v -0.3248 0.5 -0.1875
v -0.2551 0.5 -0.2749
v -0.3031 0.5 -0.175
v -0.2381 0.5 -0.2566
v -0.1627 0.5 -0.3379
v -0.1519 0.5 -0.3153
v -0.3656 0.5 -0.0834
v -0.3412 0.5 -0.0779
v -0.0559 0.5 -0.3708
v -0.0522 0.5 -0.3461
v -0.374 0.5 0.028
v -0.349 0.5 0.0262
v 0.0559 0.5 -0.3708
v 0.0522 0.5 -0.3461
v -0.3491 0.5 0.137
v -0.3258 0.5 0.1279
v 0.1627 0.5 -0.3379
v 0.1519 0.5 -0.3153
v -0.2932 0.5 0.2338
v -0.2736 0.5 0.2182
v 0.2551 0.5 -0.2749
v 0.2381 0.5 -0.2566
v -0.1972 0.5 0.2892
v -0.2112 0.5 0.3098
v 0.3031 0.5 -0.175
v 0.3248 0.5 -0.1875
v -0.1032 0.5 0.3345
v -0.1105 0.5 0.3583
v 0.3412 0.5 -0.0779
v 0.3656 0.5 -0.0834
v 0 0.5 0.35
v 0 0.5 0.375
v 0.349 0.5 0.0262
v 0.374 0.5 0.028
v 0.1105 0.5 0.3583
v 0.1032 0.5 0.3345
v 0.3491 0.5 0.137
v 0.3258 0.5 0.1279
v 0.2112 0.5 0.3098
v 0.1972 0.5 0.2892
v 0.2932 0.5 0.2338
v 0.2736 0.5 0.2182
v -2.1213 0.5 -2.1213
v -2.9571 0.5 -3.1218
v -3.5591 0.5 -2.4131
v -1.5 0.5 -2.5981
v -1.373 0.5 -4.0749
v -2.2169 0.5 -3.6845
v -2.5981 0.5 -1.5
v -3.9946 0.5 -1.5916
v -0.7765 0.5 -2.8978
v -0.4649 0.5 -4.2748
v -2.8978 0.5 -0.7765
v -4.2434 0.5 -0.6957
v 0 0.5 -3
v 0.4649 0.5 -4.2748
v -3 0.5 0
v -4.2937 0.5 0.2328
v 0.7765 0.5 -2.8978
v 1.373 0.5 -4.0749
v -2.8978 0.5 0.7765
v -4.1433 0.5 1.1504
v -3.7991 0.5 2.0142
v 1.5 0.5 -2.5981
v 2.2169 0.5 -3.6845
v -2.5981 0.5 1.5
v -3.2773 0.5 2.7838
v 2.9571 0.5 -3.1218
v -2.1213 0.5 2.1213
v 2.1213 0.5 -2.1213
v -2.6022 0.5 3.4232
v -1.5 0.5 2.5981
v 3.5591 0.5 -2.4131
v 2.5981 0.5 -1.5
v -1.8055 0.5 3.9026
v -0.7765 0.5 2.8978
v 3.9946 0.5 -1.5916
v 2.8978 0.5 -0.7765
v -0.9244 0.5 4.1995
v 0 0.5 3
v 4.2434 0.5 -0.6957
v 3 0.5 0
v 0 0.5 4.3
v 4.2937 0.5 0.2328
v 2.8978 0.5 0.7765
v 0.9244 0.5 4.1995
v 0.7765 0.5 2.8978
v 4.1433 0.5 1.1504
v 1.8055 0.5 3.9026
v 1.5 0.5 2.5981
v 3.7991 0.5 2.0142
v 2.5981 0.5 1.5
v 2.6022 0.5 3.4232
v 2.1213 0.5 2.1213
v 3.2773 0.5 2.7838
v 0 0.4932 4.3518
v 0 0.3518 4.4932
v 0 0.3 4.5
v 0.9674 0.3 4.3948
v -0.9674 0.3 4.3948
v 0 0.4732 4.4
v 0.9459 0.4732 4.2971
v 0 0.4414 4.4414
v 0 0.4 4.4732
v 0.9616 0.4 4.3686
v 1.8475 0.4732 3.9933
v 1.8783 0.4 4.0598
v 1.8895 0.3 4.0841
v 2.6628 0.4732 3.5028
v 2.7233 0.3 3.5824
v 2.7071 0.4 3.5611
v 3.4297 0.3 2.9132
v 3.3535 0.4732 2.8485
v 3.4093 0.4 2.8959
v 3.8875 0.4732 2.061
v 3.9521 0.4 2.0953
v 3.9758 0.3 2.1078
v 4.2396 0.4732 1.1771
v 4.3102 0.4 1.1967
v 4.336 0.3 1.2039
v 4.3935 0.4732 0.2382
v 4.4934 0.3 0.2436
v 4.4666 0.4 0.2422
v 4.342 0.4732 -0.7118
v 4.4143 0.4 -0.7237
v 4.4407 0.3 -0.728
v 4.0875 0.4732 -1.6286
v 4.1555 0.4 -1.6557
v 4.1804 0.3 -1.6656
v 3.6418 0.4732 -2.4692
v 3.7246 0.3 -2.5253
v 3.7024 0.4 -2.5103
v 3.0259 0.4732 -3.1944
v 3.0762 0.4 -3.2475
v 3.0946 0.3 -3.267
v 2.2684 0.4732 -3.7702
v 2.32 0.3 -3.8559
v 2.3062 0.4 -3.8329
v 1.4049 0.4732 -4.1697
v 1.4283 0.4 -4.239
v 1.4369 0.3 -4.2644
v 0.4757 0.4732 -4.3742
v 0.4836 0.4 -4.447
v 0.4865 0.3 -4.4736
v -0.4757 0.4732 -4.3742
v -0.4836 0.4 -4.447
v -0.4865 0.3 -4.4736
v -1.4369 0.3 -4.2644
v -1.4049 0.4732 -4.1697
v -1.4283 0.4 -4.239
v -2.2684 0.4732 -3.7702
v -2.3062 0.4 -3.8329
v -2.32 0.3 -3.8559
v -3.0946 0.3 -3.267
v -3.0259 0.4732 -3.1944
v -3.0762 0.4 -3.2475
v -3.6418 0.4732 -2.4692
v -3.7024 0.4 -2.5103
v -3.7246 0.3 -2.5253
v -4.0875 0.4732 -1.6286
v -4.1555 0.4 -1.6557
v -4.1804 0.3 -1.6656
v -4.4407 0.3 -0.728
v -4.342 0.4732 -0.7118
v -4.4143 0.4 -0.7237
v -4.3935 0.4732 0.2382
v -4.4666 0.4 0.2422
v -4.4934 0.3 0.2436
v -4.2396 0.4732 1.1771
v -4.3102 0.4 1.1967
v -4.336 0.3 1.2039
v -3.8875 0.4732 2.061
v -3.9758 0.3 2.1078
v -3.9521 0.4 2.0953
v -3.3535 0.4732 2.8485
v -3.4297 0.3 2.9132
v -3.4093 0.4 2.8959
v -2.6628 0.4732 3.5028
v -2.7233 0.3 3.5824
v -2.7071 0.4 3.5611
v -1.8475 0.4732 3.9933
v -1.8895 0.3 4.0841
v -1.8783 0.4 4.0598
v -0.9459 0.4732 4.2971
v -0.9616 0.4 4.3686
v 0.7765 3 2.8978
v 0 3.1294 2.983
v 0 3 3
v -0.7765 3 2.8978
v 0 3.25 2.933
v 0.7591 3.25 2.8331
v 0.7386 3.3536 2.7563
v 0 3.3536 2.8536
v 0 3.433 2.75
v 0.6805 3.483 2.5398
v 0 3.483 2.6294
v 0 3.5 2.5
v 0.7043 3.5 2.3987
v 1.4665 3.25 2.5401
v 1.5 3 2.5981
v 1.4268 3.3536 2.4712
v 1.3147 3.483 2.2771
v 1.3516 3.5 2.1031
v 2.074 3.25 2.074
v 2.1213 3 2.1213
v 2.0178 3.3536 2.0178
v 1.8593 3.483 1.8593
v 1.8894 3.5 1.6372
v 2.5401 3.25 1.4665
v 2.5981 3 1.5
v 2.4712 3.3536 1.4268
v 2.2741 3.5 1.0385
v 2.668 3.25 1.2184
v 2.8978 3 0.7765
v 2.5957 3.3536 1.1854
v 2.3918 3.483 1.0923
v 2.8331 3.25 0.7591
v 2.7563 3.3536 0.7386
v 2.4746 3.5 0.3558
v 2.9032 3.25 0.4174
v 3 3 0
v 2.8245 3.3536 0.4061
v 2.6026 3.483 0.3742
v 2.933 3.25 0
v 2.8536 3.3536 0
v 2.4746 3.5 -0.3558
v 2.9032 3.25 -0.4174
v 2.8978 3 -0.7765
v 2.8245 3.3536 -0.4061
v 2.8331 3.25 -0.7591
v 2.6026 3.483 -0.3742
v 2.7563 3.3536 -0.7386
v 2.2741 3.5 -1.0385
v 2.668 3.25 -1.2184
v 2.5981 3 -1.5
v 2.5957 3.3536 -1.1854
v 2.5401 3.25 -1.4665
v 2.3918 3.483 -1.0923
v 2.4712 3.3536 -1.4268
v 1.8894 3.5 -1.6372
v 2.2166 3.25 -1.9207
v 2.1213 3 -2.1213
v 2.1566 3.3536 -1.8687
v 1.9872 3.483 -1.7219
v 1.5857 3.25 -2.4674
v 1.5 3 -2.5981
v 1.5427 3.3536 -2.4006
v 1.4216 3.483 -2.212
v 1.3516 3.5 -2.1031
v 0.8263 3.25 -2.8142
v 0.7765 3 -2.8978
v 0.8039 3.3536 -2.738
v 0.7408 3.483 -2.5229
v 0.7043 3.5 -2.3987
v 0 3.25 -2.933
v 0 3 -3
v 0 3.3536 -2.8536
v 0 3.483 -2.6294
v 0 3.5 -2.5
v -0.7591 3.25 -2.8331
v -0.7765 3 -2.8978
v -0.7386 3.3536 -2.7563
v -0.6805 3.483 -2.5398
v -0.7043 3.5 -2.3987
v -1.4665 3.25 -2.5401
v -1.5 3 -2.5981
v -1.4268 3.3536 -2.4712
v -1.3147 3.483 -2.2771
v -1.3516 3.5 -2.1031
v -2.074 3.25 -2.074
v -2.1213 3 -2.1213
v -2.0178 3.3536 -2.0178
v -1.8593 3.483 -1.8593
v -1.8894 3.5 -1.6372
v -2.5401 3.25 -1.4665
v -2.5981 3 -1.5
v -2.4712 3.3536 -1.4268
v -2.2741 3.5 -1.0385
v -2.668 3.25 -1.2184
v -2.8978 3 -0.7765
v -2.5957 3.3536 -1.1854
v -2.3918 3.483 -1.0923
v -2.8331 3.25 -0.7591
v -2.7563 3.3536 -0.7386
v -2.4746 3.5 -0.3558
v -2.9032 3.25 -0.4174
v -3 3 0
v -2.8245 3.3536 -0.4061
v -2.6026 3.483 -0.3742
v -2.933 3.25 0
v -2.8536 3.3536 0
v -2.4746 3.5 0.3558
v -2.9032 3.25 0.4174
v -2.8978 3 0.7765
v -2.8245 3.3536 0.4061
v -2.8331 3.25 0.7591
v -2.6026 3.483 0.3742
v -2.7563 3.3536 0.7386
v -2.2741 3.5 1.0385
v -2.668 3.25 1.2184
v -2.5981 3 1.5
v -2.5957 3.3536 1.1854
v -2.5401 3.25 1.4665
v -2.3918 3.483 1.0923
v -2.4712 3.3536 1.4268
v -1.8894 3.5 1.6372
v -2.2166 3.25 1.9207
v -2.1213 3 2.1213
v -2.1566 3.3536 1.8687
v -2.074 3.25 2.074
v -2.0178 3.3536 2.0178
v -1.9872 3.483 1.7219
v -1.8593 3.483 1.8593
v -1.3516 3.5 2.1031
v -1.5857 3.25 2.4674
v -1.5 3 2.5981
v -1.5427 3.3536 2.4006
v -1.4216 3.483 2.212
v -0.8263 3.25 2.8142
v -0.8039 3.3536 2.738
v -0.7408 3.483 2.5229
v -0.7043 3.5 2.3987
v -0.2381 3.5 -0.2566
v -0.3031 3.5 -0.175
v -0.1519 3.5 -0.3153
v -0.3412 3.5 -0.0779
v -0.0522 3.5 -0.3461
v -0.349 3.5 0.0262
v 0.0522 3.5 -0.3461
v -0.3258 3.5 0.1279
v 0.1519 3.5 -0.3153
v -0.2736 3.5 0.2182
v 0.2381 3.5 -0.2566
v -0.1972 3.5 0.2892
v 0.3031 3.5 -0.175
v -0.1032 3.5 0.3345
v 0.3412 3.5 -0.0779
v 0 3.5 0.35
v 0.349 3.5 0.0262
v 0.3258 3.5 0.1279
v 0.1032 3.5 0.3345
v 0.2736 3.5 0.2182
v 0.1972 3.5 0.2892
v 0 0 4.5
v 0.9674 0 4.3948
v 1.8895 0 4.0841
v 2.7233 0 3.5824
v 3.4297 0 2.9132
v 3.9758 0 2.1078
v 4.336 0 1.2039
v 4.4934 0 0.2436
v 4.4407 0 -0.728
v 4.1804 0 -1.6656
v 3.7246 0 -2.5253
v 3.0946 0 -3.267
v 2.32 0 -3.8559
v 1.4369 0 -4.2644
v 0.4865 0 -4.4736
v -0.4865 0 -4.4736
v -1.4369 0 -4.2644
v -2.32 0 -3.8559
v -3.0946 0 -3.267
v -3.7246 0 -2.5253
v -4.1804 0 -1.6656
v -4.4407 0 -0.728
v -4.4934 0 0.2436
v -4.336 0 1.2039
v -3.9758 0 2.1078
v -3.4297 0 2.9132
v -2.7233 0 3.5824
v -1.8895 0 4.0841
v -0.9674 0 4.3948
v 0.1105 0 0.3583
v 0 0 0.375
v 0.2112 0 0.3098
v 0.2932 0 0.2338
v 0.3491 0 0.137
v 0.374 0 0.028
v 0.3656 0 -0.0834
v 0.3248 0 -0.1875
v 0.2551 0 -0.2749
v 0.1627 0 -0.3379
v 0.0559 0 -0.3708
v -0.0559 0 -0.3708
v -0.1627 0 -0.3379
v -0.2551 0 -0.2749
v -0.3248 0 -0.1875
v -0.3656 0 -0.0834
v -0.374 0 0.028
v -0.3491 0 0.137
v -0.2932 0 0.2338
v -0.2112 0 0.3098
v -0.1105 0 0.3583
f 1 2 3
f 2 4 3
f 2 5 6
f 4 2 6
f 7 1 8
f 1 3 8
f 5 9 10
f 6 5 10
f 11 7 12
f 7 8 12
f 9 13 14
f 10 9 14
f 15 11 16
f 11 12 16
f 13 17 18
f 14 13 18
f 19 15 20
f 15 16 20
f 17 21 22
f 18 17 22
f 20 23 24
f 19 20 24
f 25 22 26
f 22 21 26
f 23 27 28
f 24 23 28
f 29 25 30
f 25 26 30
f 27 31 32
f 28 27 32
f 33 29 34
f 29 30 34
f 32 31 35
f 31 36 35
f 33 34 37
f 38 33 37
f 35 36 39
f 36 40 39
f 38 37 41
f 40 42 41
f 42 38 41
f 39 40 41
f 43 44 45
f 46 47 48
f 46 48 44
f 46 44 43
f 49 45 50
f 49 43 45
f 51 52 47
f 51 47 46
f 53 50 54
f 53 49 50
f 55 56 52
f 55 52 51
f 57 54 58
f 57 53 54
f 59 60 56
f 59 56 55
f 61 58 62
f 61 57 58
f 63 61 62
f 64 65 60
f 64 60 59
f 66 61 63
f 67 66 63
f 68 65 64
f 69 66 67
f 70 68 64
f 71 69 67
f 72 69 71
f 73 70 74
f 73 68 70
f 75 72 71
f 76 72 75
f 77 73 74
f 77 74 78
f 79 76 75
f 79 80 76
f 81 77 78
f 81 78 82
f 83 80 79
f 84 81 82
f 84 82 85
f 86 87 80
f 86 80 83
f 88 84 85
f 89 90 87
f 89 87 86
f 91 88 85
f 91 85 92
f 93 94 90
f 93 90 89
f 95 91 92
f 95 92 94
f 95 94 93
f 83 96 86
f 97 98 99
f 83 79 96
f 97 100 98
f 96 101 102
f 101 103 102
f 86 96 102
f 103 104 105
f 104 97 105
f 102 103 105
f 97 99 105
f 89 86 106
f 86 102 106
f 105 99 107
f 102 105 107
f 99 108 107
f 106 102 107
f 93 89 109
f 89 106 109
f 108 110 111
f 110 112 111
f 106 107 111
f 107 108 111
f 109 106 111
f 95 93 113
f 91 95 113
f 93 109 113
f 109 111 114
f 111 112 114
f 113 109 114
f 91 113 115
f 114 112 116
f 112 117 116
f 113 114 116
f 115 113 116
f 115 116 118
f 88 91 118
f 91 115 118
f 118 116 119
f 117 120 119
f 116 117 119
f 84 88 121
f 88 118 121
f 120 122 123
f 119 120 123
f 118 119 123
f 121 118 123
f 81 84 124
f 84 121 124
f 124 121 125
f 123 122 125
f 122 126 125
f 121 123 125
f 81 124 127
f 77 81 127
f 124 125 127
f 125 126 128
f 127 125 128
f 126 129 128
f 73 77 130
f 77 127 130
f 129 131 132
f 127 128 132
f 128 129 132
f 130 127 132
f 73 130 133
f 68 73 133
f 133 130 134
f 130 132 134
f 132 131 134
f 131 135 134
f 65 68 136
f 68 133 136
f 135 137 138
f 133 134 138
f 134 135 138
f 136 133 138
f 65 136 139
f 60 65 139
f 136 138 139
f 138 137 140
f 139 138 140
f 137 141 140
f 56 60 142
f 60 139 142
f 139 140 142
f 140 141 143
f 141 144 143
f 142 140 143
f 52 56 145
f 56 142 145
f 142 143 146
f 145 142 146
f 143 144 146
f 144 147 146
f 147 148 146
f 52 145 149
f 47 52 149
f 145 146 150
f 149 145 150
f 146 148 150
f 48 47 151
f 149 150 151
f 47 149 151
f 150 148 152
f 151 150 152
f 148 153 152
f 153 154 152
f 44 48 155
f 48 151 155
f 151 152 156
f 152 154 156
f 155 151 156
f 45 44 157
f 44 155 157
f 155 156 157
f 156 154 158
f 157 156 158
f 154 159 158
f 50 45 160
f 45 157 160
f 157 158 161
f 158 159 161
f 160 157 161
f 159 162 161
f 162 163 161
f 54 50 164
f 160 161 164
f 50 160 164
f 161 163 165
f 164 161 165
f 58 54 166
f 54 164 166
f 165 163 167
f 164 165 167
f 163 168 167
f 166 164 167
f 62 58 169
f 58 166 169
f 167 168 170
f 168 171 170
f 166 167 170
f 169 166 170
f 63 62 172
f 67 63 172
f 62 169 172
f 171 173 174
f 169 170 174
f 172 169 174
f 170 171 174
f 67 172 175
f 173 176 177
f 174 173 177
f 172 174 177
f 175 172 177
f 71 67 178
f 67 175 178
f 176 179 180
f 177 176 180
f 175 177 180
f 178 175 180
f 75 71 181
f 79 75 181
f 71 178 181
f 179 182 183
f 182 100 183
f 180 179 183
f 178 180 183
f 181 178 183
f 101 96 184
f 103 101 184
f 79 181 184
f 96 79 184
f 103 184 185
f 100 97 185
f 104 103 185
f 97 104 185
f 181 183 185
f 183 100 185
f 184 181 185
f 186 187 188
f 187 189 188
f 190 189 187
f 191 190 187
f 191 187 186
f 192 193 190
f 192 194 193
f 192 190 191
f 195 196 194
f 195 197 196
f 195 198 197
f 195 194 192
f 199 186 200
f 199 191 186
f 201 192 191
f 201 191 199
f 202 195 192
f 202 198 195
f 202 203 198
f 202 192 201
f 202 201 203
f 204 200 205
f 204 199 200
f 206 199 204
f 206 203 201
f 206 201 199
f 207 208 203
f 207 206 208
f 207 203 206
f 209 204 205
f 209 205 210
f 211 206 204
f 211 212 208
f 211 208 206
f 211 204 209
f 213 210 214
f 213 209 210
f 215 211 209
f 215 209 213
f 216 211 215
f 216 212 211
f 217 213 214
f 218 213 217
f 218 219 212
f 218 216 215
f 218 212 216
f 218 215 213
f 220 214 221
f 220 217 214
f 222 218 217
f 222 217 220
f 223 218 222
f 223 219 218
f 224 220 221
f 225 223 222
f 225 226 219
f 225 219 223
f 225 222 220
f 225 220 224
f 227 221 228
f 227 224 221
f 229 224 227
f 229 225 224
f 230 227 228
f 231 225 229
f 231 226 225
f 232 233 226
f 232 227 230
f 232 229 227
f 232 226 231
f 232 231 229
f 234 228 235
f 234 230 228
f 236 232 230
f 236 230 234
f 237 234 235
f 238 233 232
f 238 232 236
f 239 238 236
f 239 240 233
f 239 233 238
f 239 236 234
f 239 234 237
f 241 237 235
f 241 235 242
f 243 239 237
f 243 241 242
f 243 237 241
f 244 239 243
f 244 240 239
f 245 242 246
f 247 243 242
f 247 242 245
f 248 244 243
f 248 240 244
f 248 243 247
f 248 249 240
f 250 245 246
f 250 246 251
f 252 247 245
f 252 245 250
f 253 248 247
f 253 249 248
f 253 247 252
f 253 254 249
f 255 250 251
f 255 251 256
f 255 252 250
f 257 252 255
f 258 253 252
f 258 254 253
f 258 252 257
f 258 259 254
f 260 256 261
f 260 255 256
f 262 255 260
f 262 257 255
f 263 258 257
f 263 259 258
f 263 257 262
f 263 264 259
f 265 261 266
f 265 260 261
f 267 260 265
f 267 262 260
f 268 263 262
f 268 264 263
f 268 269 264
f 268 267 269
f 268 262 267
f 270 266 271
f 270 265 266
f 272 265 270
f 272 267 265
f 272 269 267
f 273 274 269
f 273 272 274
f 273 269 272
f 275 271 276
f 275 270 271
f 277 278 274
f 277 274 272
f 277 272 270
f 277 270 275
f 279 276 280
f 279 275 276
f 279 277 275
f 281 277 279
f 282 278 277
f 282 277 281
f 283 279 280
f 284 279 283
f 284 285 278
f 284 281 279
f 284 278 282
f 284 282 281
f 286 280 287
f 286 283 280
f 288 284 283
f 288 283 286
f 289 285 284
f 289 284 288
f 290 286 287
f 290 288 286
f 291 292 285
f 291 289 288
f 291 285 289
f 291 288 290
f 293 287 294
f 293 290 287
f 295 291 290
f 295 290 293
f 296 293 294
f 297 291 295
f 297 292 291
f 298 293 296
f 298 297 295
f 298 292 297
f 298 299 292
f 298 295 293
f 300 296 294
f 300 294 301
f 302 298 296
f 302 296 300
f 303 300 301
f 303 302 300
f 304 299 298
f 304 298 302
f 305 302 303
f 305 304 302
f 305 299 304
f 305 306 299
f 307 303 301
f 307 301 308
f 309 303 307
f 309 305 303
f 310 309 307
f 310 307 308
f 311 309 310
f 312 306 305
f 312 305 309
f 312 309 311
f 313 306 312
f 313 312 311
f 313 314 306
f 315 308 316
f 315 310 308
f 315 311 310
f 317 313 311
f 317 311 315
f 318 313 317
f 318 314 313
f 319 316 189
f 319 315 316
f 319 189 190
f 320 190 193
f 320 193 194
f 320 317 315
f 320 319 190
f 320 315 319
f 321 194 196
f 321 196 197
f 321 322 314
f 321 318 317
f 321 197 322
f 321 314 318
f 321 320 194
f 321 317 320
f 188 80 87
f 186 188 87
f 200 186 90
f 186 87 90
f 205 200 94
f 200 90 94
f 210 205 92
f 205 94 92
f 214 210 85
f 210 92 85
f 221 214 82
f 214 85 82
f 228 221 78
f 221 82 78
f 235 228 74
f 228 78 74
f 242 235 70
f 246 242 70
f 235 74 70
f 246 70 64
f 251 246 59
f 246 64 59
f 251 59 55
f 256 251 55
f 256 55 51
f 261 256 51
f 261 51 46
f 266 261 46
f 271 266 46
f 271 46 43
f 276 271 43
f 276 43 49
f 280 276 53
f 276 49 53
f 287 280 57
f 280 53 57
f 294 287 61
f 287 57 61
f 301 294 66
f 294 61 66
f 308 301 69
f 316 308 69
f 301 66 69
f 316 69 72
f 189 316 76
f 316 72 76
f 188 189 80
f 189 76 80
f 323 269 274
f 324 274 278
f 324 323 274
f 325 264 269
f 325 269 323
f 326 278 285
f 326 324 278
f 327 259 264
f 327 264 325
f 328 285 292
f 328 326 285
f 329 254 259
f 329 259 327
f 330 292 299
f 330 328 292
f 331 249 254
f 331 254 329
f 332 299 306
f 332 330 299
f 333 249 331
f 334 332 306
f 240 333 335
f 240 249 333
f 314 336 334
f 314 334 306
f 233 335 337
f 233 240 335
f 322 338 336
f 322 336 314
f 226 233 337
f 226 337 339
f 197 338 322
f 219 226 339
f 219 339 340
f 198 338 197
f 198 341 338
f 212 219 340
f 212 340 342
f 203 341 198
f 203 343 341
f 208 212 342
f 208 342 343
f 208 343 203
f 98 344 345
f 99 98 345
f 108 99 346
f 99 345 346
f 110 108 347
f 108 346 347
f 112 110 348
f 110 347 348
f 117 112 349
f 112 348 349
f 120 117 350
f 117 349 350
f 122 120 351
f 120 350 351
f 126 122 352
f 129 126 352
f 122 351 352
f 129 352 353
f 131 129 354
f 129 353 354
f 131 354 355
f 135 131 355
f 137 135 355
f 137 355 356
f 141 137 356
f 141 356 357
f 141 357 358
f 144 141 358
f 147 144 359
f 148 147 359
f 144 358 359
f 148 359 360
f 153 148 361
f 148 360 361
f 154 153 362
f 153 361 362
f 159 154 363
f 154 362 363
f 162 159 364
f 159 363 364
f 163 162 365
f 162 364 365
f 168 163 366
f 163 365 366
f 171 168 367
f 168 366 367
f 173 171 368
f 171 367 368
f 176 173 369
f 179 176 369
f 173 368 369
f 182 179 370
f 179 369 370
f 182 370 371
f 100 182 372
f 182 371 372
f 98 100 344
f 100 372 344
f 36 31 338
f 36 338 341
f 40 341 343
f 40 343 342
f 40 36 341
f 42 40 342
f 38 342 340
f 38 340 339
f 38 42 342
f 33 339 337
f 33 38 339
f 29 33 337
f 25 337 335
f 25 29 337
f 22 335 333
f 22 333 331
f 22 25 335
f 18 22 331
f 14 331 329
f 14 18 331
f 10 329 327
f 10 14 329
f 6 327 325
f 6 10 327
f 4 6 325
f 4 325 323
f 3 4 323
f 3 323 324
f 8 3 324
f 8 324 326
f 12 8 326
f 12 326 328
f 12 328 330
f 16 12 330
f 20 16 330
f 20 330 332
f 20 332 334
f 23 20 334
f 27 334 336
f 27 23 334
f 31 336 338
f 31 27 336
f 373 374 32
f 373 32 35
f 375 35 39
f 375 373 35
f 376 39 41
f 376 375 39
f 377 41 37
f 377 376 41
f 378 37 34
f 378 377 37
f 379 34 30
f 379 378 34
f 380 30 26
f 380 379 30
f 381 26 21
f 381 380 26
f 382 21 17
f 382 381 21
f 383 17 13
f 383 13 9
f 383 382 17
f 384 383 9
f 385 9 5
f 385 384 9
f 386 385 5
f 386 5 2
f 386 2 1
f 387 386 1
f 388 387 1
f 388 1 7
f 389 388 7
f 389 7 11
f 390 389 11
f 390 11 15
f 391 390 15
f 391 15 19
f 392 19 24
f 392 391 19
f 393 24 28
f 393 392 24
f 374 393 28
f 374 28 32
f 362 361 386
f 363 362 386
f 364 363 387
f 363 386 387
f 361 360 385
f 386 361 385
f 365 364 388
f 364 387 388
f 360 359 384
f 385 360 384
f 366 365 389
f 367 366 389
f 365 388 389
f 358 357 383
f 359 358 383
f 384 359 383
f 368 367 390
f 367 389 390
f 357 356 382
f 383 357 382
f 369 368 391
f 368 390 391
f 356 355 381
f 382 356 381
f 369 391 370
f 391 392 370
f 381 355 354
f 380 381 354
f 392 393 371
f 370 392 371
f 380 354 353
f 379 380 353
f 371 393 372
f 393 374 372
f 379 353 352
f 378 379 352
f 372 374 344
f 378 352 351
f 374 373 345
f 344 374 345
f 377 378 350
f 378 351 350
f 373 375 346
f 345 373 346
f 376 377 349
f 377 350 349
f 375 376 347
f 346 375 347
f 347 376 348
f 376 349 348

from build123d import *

# Parameters (mm, degrees)
SKETCH1_R           = 4.5
SKETCH1_R_2         = 0.375
BOSS_EXTRUDE1_DEPTH = 0.5
SKETCH2_R           = 3
SKETCH2_R_2         = 0.35
BOSS_EXTRUDE2_DEPTH = 3
FILLET1_R           = 0.5
FILLET2_R           = 0.2


with BuildPart() as part:
    # Sketch1 → Boss-Extrude1 (new body)
    with BuildSketch(Plane(origin=(0, 0, 0), x_dir=(1, 0, 0), z_dir=(0, 1, 0))):
        with Locations(Location((0, 0, 0), (0, 0, 270))):
            Circle(SKETCH1_R)
        with Locations(Location((0, 0, 0), (0, 0, 270))):
            Circle(SKETCH1_R_2, mode=Mode.SUBTRACT)
    extrude(amount=BOSS_EXTRUDE1_DEPTH)

    # Sketch2 → Boss-Extrude2 (add)
    with BuildSketch(Plane(origin=(0, 0.5, 0), x_dir=(1, 0, 0), z_dir=(0, 1, 0))):
        with Locations(Location((0, 0, 0), (0, 0, 270))):
            Circle(SKETCH2_R)
        with Locations(Location((0, 0, 0), (0, 0, 270))):
            Circle(SKETCH2_R_2, mode=Mode.SUBTRACT)
    extrude(amount=BOSS_EXTRUDE2_DEPTH)

    # Fillet1
    fillet1_edges = [part.edges().sort_by_distance(p)[0] for p in [
        (0, 3.5, -3),
    ]]
    fillet(fillet1_edges, radius=FILLET1_R)

    # Fillet2
    fillet2_edges = [part.edges().sort_by_distance(p)[0] for p in [
        (0, 0.5, -4.5),
    ]]
    fillet(fillet2_edges, radius=FILLET2_R)


solid = part.part
